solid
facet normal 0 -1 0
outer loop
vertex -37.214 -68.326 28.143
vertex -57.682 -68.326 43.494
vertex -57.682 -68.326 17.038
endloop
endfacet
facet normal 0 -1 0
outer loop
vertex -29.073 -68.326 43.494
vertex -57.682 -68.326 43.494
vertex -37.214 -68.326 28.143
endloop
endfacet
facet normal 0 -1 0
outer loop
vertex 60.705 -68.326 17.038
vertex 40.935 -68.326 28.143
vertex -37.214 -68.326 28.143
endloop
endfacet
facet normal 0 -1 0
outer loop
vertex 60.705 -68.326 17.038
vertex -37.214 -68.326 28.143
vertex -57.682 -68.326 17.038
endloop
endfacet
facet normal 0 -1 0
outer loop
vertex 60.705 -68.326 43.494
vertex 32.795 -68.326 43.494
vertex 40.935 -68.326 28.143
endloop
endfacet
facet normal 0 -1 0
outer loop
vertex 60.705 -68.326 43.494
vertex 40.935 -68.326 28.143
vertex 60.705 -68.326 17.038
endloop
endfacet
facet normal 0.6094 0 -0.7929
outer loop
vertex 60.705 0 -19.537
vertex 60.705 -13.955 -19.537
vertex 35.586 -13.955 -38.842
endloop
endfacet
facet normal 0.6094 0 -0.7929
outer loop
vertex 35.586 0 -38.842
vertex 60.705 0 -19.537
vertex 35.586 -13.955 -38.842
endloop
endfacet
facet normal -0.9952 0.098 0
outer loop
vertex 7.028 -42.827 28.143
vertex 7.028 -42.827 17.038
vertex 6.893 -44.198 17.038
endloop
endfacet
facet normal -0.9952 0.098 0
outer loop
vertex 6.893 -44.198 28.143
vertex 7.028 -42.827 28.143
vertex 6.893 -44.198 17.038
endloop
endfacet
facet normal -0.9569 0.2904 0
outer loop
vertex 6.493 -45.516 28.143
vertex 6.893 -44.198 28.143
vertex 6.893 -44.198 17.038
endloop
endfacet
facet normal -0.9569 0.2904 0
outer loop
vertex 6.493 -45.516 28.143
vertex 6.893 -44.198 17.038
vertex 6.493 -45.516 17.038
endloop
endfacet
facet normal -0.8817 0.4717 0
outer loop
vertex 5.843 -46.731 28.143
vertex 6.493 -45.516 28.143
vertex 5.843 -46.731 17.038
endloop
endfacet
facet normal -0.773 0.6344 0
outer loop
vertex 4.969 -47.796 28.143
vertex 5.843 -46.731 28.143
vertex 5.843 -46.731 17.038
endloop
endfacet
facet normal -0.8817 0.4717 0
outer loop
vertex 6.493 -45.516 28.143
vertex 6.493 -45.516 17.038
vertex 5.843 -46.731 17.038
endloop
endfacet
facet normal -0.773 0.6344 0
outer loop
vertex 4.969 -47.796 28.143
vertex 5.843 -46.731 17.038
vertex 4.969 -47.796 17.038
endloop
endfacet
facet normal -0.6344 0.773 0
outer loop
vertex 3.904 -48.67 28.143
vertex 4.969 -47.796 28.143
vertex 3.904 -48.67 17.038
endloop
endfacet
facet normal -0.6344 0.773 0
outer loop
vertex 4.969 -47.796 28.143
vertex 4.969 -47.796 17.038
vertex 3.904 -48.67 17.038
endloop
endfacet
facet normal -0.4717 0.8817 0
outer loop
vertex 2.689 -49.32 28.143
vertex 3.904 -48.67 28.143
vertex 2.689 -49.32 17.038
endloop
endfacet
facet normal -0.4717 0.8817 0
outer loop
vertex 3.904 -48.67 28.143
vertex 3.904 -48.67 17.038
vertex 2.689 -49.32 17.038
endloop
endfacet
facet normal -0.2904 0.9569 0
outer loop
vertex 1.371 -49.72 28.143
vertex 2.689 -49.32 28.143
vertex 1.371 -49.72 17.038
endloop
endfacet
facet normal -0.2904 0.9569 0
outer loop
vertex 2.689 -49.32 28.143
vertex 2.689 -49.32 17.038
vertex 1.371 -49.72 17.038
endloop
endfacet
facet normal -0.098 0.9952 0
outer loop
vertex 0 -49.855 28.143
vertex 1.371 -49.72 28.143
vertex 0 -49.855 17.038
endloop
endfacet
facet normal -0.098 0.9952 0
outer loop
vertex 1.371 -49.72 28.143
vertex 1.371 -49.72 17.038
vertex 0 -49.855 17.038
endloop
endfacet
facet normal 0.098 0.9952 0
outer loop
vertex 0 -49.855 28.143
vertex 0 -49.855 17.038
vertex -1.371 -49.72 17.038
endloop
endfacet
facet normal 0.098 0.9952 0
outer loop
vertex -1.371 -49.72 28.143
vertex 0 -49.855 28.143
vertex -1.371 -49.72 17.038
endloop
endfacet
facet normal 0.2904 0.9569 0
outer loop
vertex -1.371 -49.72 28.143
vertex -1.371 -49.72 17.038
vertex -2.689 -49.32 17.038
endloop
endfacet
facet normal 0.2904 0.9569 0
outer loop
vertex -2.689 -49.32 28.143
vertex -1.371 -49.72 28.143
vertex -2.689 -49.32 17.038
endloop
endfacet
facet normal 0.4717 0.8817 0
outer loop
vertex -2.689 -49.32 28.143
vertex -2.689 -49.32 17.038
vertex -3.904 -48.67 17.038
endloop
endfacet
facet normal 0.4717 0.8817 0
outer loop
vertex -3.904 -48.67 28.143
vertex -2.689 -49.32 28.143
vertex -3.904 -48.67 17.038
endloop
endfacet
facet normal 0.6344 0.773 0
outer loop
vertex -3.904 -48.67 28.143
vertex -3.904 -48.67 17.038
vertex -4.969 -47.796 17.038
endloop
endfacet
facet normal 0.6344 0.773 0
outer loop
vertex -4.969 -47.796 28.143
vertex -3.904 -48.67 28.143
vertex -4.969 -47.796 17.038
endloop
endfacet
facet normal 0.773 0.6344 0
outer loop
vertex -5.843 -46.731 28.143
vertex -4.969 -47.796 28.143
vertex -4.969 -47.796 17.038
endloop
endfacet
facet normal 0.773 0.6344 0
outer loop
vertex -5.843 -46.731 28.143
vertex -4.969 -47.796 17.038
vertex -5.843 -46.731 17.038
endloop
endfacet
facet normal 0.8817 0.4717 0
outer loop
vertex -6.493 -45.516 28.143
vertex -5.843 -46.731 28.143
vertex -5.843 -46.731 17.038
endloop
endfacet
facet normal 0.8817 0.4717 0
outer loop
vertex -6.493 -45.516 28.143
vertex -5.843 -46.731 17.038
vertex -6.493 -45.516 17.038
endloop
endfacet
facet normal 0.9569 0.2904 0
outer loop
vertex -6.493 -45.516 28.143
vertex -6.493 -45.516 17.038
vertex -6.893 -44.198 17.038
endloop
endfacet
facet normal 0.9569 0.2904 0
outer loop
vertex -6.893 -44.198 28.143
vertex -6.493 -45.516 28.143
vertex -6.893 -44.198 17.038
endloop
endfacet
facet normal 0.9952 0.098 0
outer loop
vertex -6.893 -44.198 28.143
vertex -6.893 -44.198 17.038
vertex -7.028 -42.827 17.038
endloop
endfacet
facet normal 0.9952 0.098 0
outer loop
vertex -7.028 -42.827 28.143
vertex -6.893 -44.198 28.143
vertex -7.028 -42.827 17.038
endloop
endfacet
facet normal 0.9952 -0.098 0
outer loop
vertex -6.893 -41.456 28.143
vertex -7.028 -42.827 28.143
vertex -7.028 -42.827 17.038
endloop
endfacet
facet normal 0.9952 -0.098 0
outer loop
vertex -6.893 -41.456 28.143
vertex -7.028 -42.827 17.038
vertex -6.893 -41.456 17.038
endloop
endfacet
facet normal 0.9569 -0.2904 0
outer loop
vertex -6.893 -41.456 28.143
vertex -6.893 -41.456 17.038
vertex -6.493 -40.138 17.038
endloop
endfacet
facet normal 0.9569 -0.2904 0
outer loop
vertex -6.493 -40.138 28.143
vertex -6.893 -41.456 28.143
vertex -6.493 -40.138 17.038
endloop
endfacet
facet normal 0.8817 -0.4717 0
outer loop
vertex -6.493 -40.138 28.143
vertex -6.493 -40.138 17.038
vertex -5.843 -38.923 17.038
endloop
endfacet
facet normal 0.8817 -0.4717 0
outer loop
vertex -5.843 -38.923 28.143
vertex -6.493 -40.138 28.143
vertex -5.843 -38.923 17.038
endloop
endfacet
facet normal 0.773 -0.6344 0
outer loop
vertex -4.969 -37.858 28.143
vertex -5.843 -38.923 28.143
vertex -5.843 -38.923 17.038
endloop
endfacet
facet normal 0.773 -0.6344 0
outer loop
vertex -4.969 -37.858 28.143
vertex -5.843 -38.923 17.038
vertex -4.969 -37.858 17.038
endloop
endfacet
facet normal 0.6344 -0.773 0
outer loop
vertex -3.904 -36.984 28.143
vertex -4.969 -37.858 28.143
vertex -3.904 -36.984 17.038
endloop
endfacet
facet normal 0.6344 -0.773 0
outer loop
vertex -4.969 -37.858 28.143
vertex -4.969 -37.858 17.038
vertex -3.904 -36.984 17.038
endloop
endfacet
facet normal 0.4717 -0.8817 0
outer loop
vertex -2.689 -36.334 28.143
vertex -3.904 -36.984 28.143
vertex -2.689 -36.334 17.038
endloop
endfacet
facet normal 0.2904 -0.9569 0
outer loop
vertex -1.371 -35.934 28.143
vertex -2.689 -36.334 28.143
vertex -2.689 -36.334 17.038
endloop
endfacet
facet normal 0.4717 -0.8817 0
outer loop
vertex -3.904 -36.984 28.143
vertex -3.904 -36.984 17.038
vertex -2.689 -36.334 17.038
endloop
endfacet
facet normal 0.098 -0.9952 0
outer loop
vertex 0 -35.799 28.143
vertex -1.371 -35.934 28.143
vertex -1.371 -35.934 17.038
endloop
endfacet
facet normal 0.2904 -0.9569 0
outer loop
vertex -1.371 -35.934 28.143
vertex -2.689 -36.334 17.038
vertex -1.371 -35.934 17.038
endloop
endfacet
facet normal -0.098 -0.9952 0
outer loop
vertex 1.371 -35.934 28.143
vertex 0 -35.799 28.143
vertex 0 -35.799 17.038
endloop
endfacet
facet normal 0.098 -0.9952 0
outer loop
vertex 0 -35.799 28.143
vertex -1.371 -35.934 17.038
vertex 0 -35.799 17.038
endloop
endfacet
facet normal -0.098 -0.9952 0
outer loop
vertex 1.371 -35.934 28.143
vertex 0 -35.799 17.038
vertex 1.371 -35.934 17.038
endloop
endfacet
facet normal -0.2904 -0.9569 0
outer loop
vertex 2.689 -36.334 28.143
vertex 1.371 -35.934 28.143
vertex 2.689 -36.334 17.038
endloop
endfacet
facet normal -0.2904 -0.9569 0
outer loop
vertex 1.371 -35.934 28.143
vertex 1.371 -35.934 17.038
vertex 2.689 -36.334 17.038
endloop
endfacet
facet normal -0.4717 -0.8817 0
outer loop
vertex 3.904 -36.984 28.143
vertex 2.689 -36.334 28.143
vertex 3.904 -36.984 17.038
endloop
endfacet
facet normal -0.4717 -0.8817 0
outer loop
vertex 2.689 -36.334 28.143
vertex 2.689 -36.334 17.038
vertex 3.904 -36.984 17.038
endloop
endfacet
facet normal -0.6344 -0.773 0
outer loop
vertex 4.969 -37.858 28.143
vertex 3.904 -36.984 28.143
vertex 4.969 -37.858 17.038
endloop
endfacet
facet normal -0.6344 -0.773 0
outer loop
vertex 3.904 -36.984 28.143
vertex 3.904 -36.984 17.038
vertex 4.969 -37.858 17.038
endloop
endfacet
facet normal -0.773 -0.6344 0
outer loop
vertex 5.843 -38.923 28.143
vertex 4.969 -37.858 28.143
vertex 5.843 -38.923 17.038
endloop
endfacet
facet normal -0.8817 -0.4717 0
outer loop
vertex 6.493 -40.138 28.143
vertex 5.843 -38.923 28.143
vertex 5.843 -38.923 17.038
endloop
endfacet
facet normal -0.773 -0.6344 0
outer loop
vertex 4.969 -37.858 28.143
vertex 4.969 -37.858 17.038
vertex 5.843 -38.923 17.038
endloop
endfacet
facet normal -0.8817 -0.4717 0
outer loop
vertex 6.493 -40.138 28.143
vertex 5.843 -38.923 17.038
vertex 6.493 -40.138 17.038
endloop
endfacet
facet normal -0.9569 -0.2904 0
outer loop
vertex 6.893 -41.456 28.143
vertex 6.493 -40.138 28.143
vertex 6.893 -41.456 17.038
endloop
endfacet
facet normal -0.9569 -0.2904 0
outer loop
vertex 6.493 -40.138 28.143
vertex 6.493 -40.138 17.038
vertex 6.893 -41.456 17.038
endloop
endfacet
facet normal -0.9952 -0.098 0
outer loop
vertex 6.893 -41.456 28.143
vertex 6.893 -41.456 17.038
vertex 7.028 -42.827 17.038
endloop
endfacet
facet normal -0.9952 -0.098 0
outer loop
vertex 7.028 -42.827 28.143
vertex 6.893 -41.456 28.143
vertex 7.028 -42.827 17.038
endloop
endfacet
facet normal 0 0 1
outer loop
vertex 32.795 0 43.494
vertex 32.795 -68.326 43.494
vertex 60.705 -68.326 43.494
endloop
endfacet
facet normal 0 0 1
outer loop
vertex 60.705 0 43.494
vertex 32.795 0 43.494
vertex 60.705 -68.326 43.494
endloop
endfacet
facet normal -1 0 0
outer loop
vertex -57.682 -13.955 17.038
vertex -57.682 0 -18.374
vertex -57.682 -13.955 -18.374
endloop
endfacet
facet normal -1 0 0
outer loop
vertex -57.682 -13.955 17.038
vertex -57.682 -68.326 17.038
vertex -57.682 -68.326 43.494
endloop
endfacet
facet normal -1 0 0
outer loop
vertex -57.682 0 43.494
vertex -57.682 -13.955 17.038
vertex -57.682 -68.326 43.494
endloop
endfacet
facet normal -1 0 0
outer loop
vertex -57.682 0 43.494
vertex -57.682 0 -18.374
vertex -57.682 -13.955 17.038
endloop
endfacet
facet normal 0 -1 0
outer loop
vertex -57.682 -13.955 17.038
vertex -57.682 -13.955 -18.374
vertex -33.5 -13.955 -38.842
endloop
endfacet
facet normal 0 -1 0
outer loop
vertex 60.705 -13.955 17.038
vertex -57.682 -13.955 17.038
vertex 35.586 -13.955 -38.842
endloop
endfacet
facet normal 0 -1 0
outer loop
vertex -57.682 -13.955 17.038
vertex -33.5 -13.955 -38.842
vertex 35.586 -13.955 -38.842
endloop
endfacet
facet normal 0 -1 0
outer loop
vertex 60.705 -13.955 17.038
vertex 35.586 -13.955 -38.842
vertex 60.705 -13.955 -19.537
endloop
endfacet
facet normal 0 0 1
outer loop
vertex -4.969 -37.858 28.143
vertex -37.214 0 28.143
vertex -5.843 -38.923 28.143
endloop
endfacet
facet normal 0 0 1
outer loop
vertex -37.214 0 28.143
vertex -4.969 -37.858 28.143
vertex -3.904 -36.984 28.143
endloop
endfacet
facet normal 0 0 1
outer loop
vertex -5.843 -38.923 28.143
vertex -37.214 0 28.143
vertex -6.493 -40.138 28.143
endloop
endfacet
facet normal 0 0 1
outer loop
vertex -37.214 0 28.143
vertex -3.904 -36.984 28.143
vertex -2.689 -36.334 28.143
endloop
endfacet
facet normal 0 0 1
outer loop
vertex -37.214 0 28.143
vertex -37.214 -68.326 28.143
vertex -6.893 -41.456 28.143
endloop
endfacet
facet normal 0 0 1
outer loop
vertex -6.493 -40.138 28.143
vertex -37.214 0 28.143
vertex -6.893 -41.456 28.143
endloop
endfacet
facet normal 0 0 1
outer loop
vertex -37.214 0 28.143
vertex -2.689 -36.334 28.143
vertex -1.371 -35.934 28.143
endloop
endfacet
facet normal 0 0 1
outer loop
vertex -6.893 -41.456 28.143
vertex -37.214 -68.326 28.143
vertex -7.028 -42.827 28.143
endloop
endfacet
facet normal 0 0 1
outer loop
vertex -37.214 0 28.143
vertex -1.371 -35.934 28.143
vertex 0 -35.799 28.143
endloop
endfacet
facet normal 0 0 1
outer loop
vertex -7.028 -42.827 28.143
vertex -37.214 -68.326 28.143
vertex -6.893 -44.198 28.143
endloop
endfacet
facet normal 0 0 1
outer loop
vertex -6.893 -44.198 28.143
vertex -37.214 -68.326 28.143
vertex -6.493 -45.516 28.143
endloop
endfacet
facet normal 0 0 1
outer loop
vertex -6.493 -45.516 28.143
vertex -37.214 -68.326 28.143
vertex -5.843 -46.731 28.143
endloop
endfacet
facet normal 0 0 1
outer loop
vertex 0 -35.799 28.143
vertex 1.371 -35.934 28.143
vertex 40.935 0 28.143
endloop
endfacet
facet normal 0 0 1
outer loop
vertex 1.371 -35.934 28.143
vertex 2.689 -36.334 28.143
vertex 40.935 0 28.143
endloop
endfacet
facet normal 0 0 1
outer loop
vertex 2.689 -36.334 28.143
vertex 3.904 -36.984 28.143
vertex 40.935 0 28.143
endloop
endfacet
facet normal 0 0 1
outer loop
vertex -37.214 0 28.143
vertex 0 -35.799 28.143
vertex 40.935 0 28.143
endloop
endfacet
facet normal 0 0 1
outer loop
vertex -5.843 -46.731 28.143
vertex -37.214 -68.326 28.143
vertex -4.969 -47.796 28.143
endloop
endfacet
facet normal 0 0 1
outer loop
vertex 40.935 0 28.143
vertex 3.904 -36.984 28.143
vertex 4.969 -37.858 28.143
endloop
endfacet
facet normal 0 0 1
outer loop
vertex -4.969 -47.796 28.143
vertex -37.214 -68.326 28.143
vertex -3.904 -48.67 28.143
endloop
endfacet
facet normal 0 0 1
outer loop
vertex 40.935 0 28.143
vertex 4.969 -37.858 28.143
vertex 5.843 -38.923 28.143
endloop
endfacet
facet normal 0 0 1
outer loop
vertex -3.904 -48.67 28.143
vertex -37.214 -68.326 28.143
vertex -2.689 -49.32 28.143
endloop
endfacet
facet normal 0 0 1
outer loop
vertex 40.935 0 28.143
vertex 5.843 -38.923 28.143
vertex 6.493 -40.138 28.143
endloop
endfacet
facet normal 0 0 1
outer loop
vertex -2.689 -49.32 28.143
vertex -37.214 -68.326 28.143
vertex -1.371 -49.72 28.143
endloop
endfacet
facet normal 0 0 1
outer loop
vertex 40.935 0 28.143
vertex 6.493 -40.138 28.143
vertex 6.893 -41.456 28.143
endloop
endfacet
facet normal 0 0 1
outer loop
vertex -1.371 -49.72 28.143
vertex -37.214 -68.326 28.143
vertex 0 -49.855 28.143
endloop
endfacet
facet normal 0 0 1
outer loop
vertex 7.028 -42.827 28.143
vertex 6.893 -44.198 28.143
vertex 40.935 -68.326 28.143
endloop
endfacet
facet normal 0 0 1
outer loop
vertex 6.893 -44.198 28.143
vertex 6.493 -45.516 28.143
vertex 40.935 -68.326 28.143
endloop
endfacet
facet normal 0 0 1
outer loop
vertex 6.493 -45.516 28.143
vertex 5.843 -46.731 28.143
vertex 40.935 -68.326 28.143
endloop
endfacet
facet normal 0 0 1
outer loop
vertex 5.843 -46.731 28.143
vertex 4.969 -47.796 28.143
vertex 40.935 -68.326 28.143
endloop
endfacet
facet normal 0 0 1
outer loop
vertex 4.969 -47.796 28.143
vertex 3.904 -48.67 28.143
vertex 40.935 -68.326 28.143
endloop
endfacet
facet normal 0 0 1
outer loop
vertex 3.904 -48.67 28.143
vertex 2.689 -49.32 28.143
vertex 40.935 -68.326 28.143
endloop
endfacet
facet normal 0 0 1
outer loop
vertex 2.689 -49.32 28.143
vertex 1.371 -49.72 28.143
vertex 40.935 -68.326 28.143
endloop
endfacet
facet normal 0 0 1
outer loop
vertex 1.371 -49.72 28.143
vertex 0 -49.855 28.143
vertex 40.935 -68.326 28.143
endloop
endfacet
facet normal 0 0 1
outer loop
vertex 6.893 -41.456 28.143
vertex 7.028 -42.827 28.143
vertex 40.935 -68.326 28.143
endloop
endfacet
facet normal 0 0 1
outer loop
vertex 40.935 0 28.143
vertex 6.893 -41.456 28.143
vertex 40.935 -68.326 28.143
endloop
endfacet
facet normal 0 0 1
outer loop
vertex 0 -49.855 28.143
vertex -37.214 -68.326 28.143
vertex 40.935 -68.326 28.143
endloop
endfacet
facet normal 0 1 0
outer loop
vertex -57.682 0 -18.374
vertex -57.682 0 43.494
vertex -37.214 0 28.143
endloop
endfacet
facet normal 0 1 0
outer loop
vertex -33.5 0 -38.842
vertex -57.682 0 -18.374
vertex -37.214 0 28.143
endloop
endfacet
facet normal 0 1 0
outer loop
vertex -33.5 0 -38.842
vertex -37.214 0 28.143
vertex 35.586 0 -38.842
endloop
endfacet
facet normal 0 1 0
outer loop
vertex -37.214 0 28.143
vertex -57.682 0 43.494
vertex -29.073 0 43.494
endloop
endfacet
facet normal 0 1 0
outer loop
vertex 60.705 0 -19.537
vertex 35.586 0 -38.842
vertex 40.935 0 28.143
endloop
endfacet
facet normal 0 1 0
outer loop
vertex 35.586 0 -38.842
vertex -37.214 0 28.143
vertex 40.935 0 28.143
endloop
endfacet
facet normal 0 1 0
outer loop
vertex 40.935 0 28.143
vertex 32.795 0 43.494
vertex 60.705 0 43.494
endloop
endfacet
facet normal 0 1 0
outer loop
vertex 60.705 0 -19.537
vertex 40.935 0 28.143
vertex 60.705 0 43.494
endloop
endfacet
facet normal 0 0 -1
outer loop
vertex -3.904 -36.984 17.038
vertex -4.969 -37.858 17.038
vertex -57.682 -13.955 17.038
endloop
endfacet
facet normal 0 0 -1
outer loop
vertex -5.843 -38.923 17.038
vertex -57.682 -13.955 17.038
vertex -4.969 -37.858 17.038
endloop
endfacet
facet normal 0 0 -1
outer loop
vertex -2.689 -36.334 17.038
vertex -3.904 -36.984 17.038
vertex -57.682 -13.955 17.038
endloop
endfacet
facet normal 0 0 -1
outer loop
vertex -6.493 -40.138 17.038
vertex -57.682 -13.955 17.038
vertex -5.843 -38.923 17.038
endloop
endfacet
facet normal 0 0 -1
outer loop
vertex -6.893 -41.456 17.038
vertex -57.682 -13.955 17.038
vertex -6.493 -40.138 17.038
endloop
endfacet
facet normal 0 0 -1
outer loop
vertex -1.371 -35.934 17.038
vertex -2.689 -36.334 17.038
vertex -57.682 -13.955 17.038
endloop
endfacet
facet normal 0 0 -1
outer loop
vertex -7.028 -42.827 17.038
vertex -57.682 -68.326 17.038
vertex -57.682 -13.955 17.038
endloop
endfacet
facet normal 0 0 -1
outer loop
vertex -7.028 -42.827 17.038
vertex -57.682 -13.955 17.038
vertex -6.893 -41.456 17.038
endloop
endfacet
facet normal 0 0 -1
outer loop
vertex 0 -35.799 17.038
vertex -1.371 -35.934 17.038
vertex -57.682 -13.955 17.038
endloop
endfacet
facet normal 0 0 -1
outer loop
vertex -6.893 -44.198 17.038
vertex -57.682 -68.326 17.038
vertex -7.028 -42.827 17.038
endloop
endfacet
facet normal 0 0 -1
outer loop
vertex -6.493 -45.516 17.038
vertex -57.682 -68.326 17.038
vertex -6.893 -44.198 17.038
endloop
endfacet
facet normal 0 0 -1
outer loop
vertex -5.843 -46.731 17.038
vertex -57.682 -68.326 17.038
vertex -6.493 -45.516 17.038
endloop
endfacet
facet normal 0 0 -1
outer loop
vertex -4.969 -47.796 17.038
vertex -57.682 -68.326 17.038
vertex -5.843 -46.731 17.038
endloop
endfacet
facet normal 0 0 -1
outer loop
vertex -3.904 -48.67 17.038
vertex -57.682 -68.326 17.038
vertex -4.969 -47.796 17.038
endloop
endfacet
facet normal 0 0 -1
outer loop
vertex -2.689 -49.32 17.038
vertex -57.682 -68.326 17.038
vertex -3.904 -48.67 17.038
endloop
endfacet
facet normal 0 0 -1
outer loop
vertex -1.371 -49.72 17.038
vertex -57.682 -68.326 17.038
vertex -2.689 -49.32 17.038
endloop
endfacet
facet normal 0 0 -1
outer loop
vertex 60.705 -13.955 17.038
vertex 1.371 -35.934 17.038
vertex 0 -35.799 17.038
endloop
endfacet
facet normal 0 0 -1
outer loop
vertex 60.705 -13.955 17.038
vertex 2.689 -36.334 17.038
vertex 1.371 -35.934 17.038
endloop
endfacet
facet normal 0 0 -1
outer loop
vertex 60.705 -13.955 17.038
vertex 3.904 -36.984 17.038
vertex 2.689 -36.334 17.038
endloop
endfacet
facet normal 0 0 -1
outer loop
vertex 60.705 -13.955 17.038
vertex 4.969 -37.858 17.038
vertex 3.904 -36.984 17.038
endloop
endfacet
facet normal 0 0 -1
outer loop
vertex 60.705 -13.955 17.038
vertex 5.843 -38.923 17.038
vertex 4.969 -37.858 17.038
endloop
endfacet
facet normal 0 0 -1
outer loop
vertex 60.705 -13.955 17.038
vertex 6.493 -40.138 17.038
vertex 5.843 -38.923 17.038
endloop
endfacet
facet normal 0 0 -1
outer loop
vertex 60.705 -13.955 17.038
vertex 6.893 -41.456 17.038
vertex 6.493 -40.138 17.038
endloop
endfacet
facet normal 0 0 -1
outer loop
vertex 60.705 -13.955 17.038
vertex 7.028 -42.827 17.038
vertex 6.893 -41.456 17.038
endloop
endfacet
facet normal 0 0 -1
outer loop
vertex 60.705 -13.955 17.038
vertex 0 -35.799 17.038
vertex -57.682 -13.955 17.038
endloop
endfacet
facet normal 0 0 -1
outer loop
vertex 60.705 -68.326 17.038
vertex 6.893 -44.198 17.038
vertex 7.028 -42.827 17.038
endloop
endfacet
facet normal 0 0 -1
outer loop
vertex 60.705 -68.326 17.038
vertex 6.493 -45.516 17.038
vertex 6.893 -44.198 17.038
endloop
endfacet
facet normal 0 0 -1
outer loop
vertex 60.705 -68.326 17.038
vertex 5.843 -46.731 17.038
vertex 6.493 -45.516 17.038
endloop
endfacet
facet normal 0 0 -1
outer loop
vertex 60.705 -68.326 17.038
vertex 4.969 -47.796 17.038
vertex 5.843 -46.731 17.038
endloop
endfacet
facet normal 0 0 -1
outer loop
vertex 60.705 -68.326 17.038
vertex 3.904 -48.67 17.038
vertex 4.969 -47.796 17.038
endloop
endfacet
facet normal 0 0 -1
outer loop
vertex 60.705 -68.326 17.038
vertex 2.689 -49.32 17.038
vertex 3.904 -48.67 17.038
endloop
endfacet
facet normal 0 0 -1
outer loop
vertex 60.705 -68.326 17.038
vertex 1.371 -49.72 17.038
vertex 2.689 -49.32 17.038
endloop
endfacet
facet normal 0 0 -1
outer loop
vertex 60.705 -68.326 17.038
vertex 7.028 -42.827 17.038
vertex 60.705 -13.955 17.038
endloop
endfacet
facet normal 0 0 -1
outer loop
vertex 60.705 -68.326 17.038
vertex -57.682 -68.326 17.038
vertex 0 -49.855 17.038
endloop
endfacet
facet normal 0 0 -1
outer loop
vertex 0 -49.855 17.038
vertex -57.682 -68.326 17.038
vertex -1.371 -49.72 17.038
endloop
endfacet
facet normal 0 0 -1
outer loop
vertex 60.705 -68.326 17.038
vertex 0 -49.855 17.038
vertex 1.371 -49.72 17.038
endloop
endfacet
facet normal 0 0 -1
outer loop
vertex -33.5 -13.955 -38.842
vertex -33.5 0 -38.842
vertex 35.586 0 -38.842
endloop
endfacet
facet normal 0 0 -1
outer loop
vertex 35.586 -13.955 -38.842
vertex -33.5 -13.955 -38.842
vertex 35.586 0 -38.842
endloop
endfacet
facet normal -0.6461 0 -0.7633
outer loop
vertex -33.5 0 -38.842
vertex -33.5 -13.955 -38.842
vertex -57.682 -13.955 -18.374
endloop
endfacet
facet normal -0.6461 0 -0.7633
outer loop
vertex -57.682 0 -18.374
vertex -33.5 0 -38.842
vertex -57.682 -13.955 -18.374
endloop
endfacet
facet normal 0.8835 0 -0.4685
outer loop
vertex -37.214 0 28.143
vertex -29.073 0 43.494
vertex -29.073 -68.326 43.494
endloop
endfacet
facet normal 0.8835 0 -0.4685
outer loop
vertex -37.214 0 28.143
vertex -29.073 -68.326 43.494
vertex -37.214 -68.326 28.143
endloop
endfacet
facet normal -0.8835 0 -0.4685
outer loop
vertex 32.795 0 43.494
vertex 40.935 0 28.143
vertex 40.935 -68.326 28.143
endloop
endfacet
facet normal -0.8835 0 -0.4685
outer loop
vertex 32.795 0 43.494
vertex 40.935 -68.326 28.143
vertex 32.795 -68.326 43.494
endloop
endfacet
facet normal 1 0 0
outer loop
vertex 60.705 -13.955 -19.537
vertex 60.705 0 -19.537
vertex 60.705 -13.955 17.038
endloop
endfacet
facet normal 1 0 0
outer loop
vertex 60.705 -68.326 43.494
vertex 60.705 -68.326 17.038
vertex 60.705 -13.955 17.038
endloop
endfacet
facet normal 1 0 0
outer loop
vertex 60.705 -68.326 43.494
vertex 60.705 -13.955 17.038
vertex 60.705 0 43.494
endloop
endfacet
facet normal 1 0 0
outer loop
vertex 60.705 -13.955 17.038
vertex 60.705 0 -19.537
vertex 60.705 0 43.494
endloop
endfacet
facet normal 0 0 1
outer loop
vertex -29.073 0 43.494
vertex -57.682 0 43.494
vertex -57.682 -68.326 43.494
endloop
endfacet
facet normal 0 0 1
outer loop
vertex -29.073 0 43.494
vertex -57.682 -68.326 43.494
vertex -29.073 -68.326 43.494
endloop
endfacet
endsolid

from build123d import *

# Parameters (mm, degrees)
F0_W     = 118.3868944645
F0_H     = 82.3358744383
F1_DEPTH = 68.326
F2_W     = 118.3868944645
F2_H     = 54.3707673127
F3_DEPTH = 55.88
F5_DEPTH = 25.4
F7_DEPTH = 87.122
F8_R     = 7.0278301123
F9_DEPTH = 25.4


with BuildPart() as f1:
    # F0 (on Front) → F1 (new body)
    with BuildSketch(Plane.XZ):
        with Locations((1.5118196607, 2.325873822)):
            Rectangle(F0_W, F0_H)
    extrude(amount=F1_DEPTH)

    # F2 (on face) → F3 (cut)
    with BuildSketch(Plane(origin=(0, 0, -38.8420633972), x_dir=(1, 0, 0), z_dir=(0, 0, -1))):
        with Locations((1.5118196607, 41.1406163436)):
            Rectangle(F2_W, F2_H)
    extrude(amount=-F3_DEPTH, mode=Mode.SUBTRACT)

    # F4 (on face) → F5 (cut)
    with BuildSketch(Plane.XZ.offset(13.9552326873)):
        Polygon((60.7052668929, -19.5373259485), (35.5858430266, -38.8420633972), (60.7052668929, -38.8420633972), align=None)
        Polygon((-57.6816275716, -38.8420633972), (-33.5003801701, -38.8420633972), (-57.6816275716, -18.3743909001), align=None)
    extrude(amount=-F5_DEPTH, mode=Mode.SUBTRACT)

    # F6 (on face) → F7 (cut)
    with BuildSketch(Plane.XZ.offset(68.326)):
        Polygon((40.9353487194, 28.1430520117), (32.7947959304, 43.4938110411), (-29.0733985603, 43.4938110411), (-37.2139513493, 28.1430520117), align=None)
    extrude(amount=-F7_DEPTH, mode=Mode.SUBTRACT)

    # F8 (on face) → F9 (cut)
    with BuildSketch(Plane(origin=(0, 0, 17.0379366028), x_dir=(1, 0, 0), z_dir=(0, 0, -1))):
        with Locations((0, 42.8269580007)):
            Circle(F8_R)
    extrude(amount=-F9_DEPTH, mode=Mode.SUBTRACT)


solid = f1.part
